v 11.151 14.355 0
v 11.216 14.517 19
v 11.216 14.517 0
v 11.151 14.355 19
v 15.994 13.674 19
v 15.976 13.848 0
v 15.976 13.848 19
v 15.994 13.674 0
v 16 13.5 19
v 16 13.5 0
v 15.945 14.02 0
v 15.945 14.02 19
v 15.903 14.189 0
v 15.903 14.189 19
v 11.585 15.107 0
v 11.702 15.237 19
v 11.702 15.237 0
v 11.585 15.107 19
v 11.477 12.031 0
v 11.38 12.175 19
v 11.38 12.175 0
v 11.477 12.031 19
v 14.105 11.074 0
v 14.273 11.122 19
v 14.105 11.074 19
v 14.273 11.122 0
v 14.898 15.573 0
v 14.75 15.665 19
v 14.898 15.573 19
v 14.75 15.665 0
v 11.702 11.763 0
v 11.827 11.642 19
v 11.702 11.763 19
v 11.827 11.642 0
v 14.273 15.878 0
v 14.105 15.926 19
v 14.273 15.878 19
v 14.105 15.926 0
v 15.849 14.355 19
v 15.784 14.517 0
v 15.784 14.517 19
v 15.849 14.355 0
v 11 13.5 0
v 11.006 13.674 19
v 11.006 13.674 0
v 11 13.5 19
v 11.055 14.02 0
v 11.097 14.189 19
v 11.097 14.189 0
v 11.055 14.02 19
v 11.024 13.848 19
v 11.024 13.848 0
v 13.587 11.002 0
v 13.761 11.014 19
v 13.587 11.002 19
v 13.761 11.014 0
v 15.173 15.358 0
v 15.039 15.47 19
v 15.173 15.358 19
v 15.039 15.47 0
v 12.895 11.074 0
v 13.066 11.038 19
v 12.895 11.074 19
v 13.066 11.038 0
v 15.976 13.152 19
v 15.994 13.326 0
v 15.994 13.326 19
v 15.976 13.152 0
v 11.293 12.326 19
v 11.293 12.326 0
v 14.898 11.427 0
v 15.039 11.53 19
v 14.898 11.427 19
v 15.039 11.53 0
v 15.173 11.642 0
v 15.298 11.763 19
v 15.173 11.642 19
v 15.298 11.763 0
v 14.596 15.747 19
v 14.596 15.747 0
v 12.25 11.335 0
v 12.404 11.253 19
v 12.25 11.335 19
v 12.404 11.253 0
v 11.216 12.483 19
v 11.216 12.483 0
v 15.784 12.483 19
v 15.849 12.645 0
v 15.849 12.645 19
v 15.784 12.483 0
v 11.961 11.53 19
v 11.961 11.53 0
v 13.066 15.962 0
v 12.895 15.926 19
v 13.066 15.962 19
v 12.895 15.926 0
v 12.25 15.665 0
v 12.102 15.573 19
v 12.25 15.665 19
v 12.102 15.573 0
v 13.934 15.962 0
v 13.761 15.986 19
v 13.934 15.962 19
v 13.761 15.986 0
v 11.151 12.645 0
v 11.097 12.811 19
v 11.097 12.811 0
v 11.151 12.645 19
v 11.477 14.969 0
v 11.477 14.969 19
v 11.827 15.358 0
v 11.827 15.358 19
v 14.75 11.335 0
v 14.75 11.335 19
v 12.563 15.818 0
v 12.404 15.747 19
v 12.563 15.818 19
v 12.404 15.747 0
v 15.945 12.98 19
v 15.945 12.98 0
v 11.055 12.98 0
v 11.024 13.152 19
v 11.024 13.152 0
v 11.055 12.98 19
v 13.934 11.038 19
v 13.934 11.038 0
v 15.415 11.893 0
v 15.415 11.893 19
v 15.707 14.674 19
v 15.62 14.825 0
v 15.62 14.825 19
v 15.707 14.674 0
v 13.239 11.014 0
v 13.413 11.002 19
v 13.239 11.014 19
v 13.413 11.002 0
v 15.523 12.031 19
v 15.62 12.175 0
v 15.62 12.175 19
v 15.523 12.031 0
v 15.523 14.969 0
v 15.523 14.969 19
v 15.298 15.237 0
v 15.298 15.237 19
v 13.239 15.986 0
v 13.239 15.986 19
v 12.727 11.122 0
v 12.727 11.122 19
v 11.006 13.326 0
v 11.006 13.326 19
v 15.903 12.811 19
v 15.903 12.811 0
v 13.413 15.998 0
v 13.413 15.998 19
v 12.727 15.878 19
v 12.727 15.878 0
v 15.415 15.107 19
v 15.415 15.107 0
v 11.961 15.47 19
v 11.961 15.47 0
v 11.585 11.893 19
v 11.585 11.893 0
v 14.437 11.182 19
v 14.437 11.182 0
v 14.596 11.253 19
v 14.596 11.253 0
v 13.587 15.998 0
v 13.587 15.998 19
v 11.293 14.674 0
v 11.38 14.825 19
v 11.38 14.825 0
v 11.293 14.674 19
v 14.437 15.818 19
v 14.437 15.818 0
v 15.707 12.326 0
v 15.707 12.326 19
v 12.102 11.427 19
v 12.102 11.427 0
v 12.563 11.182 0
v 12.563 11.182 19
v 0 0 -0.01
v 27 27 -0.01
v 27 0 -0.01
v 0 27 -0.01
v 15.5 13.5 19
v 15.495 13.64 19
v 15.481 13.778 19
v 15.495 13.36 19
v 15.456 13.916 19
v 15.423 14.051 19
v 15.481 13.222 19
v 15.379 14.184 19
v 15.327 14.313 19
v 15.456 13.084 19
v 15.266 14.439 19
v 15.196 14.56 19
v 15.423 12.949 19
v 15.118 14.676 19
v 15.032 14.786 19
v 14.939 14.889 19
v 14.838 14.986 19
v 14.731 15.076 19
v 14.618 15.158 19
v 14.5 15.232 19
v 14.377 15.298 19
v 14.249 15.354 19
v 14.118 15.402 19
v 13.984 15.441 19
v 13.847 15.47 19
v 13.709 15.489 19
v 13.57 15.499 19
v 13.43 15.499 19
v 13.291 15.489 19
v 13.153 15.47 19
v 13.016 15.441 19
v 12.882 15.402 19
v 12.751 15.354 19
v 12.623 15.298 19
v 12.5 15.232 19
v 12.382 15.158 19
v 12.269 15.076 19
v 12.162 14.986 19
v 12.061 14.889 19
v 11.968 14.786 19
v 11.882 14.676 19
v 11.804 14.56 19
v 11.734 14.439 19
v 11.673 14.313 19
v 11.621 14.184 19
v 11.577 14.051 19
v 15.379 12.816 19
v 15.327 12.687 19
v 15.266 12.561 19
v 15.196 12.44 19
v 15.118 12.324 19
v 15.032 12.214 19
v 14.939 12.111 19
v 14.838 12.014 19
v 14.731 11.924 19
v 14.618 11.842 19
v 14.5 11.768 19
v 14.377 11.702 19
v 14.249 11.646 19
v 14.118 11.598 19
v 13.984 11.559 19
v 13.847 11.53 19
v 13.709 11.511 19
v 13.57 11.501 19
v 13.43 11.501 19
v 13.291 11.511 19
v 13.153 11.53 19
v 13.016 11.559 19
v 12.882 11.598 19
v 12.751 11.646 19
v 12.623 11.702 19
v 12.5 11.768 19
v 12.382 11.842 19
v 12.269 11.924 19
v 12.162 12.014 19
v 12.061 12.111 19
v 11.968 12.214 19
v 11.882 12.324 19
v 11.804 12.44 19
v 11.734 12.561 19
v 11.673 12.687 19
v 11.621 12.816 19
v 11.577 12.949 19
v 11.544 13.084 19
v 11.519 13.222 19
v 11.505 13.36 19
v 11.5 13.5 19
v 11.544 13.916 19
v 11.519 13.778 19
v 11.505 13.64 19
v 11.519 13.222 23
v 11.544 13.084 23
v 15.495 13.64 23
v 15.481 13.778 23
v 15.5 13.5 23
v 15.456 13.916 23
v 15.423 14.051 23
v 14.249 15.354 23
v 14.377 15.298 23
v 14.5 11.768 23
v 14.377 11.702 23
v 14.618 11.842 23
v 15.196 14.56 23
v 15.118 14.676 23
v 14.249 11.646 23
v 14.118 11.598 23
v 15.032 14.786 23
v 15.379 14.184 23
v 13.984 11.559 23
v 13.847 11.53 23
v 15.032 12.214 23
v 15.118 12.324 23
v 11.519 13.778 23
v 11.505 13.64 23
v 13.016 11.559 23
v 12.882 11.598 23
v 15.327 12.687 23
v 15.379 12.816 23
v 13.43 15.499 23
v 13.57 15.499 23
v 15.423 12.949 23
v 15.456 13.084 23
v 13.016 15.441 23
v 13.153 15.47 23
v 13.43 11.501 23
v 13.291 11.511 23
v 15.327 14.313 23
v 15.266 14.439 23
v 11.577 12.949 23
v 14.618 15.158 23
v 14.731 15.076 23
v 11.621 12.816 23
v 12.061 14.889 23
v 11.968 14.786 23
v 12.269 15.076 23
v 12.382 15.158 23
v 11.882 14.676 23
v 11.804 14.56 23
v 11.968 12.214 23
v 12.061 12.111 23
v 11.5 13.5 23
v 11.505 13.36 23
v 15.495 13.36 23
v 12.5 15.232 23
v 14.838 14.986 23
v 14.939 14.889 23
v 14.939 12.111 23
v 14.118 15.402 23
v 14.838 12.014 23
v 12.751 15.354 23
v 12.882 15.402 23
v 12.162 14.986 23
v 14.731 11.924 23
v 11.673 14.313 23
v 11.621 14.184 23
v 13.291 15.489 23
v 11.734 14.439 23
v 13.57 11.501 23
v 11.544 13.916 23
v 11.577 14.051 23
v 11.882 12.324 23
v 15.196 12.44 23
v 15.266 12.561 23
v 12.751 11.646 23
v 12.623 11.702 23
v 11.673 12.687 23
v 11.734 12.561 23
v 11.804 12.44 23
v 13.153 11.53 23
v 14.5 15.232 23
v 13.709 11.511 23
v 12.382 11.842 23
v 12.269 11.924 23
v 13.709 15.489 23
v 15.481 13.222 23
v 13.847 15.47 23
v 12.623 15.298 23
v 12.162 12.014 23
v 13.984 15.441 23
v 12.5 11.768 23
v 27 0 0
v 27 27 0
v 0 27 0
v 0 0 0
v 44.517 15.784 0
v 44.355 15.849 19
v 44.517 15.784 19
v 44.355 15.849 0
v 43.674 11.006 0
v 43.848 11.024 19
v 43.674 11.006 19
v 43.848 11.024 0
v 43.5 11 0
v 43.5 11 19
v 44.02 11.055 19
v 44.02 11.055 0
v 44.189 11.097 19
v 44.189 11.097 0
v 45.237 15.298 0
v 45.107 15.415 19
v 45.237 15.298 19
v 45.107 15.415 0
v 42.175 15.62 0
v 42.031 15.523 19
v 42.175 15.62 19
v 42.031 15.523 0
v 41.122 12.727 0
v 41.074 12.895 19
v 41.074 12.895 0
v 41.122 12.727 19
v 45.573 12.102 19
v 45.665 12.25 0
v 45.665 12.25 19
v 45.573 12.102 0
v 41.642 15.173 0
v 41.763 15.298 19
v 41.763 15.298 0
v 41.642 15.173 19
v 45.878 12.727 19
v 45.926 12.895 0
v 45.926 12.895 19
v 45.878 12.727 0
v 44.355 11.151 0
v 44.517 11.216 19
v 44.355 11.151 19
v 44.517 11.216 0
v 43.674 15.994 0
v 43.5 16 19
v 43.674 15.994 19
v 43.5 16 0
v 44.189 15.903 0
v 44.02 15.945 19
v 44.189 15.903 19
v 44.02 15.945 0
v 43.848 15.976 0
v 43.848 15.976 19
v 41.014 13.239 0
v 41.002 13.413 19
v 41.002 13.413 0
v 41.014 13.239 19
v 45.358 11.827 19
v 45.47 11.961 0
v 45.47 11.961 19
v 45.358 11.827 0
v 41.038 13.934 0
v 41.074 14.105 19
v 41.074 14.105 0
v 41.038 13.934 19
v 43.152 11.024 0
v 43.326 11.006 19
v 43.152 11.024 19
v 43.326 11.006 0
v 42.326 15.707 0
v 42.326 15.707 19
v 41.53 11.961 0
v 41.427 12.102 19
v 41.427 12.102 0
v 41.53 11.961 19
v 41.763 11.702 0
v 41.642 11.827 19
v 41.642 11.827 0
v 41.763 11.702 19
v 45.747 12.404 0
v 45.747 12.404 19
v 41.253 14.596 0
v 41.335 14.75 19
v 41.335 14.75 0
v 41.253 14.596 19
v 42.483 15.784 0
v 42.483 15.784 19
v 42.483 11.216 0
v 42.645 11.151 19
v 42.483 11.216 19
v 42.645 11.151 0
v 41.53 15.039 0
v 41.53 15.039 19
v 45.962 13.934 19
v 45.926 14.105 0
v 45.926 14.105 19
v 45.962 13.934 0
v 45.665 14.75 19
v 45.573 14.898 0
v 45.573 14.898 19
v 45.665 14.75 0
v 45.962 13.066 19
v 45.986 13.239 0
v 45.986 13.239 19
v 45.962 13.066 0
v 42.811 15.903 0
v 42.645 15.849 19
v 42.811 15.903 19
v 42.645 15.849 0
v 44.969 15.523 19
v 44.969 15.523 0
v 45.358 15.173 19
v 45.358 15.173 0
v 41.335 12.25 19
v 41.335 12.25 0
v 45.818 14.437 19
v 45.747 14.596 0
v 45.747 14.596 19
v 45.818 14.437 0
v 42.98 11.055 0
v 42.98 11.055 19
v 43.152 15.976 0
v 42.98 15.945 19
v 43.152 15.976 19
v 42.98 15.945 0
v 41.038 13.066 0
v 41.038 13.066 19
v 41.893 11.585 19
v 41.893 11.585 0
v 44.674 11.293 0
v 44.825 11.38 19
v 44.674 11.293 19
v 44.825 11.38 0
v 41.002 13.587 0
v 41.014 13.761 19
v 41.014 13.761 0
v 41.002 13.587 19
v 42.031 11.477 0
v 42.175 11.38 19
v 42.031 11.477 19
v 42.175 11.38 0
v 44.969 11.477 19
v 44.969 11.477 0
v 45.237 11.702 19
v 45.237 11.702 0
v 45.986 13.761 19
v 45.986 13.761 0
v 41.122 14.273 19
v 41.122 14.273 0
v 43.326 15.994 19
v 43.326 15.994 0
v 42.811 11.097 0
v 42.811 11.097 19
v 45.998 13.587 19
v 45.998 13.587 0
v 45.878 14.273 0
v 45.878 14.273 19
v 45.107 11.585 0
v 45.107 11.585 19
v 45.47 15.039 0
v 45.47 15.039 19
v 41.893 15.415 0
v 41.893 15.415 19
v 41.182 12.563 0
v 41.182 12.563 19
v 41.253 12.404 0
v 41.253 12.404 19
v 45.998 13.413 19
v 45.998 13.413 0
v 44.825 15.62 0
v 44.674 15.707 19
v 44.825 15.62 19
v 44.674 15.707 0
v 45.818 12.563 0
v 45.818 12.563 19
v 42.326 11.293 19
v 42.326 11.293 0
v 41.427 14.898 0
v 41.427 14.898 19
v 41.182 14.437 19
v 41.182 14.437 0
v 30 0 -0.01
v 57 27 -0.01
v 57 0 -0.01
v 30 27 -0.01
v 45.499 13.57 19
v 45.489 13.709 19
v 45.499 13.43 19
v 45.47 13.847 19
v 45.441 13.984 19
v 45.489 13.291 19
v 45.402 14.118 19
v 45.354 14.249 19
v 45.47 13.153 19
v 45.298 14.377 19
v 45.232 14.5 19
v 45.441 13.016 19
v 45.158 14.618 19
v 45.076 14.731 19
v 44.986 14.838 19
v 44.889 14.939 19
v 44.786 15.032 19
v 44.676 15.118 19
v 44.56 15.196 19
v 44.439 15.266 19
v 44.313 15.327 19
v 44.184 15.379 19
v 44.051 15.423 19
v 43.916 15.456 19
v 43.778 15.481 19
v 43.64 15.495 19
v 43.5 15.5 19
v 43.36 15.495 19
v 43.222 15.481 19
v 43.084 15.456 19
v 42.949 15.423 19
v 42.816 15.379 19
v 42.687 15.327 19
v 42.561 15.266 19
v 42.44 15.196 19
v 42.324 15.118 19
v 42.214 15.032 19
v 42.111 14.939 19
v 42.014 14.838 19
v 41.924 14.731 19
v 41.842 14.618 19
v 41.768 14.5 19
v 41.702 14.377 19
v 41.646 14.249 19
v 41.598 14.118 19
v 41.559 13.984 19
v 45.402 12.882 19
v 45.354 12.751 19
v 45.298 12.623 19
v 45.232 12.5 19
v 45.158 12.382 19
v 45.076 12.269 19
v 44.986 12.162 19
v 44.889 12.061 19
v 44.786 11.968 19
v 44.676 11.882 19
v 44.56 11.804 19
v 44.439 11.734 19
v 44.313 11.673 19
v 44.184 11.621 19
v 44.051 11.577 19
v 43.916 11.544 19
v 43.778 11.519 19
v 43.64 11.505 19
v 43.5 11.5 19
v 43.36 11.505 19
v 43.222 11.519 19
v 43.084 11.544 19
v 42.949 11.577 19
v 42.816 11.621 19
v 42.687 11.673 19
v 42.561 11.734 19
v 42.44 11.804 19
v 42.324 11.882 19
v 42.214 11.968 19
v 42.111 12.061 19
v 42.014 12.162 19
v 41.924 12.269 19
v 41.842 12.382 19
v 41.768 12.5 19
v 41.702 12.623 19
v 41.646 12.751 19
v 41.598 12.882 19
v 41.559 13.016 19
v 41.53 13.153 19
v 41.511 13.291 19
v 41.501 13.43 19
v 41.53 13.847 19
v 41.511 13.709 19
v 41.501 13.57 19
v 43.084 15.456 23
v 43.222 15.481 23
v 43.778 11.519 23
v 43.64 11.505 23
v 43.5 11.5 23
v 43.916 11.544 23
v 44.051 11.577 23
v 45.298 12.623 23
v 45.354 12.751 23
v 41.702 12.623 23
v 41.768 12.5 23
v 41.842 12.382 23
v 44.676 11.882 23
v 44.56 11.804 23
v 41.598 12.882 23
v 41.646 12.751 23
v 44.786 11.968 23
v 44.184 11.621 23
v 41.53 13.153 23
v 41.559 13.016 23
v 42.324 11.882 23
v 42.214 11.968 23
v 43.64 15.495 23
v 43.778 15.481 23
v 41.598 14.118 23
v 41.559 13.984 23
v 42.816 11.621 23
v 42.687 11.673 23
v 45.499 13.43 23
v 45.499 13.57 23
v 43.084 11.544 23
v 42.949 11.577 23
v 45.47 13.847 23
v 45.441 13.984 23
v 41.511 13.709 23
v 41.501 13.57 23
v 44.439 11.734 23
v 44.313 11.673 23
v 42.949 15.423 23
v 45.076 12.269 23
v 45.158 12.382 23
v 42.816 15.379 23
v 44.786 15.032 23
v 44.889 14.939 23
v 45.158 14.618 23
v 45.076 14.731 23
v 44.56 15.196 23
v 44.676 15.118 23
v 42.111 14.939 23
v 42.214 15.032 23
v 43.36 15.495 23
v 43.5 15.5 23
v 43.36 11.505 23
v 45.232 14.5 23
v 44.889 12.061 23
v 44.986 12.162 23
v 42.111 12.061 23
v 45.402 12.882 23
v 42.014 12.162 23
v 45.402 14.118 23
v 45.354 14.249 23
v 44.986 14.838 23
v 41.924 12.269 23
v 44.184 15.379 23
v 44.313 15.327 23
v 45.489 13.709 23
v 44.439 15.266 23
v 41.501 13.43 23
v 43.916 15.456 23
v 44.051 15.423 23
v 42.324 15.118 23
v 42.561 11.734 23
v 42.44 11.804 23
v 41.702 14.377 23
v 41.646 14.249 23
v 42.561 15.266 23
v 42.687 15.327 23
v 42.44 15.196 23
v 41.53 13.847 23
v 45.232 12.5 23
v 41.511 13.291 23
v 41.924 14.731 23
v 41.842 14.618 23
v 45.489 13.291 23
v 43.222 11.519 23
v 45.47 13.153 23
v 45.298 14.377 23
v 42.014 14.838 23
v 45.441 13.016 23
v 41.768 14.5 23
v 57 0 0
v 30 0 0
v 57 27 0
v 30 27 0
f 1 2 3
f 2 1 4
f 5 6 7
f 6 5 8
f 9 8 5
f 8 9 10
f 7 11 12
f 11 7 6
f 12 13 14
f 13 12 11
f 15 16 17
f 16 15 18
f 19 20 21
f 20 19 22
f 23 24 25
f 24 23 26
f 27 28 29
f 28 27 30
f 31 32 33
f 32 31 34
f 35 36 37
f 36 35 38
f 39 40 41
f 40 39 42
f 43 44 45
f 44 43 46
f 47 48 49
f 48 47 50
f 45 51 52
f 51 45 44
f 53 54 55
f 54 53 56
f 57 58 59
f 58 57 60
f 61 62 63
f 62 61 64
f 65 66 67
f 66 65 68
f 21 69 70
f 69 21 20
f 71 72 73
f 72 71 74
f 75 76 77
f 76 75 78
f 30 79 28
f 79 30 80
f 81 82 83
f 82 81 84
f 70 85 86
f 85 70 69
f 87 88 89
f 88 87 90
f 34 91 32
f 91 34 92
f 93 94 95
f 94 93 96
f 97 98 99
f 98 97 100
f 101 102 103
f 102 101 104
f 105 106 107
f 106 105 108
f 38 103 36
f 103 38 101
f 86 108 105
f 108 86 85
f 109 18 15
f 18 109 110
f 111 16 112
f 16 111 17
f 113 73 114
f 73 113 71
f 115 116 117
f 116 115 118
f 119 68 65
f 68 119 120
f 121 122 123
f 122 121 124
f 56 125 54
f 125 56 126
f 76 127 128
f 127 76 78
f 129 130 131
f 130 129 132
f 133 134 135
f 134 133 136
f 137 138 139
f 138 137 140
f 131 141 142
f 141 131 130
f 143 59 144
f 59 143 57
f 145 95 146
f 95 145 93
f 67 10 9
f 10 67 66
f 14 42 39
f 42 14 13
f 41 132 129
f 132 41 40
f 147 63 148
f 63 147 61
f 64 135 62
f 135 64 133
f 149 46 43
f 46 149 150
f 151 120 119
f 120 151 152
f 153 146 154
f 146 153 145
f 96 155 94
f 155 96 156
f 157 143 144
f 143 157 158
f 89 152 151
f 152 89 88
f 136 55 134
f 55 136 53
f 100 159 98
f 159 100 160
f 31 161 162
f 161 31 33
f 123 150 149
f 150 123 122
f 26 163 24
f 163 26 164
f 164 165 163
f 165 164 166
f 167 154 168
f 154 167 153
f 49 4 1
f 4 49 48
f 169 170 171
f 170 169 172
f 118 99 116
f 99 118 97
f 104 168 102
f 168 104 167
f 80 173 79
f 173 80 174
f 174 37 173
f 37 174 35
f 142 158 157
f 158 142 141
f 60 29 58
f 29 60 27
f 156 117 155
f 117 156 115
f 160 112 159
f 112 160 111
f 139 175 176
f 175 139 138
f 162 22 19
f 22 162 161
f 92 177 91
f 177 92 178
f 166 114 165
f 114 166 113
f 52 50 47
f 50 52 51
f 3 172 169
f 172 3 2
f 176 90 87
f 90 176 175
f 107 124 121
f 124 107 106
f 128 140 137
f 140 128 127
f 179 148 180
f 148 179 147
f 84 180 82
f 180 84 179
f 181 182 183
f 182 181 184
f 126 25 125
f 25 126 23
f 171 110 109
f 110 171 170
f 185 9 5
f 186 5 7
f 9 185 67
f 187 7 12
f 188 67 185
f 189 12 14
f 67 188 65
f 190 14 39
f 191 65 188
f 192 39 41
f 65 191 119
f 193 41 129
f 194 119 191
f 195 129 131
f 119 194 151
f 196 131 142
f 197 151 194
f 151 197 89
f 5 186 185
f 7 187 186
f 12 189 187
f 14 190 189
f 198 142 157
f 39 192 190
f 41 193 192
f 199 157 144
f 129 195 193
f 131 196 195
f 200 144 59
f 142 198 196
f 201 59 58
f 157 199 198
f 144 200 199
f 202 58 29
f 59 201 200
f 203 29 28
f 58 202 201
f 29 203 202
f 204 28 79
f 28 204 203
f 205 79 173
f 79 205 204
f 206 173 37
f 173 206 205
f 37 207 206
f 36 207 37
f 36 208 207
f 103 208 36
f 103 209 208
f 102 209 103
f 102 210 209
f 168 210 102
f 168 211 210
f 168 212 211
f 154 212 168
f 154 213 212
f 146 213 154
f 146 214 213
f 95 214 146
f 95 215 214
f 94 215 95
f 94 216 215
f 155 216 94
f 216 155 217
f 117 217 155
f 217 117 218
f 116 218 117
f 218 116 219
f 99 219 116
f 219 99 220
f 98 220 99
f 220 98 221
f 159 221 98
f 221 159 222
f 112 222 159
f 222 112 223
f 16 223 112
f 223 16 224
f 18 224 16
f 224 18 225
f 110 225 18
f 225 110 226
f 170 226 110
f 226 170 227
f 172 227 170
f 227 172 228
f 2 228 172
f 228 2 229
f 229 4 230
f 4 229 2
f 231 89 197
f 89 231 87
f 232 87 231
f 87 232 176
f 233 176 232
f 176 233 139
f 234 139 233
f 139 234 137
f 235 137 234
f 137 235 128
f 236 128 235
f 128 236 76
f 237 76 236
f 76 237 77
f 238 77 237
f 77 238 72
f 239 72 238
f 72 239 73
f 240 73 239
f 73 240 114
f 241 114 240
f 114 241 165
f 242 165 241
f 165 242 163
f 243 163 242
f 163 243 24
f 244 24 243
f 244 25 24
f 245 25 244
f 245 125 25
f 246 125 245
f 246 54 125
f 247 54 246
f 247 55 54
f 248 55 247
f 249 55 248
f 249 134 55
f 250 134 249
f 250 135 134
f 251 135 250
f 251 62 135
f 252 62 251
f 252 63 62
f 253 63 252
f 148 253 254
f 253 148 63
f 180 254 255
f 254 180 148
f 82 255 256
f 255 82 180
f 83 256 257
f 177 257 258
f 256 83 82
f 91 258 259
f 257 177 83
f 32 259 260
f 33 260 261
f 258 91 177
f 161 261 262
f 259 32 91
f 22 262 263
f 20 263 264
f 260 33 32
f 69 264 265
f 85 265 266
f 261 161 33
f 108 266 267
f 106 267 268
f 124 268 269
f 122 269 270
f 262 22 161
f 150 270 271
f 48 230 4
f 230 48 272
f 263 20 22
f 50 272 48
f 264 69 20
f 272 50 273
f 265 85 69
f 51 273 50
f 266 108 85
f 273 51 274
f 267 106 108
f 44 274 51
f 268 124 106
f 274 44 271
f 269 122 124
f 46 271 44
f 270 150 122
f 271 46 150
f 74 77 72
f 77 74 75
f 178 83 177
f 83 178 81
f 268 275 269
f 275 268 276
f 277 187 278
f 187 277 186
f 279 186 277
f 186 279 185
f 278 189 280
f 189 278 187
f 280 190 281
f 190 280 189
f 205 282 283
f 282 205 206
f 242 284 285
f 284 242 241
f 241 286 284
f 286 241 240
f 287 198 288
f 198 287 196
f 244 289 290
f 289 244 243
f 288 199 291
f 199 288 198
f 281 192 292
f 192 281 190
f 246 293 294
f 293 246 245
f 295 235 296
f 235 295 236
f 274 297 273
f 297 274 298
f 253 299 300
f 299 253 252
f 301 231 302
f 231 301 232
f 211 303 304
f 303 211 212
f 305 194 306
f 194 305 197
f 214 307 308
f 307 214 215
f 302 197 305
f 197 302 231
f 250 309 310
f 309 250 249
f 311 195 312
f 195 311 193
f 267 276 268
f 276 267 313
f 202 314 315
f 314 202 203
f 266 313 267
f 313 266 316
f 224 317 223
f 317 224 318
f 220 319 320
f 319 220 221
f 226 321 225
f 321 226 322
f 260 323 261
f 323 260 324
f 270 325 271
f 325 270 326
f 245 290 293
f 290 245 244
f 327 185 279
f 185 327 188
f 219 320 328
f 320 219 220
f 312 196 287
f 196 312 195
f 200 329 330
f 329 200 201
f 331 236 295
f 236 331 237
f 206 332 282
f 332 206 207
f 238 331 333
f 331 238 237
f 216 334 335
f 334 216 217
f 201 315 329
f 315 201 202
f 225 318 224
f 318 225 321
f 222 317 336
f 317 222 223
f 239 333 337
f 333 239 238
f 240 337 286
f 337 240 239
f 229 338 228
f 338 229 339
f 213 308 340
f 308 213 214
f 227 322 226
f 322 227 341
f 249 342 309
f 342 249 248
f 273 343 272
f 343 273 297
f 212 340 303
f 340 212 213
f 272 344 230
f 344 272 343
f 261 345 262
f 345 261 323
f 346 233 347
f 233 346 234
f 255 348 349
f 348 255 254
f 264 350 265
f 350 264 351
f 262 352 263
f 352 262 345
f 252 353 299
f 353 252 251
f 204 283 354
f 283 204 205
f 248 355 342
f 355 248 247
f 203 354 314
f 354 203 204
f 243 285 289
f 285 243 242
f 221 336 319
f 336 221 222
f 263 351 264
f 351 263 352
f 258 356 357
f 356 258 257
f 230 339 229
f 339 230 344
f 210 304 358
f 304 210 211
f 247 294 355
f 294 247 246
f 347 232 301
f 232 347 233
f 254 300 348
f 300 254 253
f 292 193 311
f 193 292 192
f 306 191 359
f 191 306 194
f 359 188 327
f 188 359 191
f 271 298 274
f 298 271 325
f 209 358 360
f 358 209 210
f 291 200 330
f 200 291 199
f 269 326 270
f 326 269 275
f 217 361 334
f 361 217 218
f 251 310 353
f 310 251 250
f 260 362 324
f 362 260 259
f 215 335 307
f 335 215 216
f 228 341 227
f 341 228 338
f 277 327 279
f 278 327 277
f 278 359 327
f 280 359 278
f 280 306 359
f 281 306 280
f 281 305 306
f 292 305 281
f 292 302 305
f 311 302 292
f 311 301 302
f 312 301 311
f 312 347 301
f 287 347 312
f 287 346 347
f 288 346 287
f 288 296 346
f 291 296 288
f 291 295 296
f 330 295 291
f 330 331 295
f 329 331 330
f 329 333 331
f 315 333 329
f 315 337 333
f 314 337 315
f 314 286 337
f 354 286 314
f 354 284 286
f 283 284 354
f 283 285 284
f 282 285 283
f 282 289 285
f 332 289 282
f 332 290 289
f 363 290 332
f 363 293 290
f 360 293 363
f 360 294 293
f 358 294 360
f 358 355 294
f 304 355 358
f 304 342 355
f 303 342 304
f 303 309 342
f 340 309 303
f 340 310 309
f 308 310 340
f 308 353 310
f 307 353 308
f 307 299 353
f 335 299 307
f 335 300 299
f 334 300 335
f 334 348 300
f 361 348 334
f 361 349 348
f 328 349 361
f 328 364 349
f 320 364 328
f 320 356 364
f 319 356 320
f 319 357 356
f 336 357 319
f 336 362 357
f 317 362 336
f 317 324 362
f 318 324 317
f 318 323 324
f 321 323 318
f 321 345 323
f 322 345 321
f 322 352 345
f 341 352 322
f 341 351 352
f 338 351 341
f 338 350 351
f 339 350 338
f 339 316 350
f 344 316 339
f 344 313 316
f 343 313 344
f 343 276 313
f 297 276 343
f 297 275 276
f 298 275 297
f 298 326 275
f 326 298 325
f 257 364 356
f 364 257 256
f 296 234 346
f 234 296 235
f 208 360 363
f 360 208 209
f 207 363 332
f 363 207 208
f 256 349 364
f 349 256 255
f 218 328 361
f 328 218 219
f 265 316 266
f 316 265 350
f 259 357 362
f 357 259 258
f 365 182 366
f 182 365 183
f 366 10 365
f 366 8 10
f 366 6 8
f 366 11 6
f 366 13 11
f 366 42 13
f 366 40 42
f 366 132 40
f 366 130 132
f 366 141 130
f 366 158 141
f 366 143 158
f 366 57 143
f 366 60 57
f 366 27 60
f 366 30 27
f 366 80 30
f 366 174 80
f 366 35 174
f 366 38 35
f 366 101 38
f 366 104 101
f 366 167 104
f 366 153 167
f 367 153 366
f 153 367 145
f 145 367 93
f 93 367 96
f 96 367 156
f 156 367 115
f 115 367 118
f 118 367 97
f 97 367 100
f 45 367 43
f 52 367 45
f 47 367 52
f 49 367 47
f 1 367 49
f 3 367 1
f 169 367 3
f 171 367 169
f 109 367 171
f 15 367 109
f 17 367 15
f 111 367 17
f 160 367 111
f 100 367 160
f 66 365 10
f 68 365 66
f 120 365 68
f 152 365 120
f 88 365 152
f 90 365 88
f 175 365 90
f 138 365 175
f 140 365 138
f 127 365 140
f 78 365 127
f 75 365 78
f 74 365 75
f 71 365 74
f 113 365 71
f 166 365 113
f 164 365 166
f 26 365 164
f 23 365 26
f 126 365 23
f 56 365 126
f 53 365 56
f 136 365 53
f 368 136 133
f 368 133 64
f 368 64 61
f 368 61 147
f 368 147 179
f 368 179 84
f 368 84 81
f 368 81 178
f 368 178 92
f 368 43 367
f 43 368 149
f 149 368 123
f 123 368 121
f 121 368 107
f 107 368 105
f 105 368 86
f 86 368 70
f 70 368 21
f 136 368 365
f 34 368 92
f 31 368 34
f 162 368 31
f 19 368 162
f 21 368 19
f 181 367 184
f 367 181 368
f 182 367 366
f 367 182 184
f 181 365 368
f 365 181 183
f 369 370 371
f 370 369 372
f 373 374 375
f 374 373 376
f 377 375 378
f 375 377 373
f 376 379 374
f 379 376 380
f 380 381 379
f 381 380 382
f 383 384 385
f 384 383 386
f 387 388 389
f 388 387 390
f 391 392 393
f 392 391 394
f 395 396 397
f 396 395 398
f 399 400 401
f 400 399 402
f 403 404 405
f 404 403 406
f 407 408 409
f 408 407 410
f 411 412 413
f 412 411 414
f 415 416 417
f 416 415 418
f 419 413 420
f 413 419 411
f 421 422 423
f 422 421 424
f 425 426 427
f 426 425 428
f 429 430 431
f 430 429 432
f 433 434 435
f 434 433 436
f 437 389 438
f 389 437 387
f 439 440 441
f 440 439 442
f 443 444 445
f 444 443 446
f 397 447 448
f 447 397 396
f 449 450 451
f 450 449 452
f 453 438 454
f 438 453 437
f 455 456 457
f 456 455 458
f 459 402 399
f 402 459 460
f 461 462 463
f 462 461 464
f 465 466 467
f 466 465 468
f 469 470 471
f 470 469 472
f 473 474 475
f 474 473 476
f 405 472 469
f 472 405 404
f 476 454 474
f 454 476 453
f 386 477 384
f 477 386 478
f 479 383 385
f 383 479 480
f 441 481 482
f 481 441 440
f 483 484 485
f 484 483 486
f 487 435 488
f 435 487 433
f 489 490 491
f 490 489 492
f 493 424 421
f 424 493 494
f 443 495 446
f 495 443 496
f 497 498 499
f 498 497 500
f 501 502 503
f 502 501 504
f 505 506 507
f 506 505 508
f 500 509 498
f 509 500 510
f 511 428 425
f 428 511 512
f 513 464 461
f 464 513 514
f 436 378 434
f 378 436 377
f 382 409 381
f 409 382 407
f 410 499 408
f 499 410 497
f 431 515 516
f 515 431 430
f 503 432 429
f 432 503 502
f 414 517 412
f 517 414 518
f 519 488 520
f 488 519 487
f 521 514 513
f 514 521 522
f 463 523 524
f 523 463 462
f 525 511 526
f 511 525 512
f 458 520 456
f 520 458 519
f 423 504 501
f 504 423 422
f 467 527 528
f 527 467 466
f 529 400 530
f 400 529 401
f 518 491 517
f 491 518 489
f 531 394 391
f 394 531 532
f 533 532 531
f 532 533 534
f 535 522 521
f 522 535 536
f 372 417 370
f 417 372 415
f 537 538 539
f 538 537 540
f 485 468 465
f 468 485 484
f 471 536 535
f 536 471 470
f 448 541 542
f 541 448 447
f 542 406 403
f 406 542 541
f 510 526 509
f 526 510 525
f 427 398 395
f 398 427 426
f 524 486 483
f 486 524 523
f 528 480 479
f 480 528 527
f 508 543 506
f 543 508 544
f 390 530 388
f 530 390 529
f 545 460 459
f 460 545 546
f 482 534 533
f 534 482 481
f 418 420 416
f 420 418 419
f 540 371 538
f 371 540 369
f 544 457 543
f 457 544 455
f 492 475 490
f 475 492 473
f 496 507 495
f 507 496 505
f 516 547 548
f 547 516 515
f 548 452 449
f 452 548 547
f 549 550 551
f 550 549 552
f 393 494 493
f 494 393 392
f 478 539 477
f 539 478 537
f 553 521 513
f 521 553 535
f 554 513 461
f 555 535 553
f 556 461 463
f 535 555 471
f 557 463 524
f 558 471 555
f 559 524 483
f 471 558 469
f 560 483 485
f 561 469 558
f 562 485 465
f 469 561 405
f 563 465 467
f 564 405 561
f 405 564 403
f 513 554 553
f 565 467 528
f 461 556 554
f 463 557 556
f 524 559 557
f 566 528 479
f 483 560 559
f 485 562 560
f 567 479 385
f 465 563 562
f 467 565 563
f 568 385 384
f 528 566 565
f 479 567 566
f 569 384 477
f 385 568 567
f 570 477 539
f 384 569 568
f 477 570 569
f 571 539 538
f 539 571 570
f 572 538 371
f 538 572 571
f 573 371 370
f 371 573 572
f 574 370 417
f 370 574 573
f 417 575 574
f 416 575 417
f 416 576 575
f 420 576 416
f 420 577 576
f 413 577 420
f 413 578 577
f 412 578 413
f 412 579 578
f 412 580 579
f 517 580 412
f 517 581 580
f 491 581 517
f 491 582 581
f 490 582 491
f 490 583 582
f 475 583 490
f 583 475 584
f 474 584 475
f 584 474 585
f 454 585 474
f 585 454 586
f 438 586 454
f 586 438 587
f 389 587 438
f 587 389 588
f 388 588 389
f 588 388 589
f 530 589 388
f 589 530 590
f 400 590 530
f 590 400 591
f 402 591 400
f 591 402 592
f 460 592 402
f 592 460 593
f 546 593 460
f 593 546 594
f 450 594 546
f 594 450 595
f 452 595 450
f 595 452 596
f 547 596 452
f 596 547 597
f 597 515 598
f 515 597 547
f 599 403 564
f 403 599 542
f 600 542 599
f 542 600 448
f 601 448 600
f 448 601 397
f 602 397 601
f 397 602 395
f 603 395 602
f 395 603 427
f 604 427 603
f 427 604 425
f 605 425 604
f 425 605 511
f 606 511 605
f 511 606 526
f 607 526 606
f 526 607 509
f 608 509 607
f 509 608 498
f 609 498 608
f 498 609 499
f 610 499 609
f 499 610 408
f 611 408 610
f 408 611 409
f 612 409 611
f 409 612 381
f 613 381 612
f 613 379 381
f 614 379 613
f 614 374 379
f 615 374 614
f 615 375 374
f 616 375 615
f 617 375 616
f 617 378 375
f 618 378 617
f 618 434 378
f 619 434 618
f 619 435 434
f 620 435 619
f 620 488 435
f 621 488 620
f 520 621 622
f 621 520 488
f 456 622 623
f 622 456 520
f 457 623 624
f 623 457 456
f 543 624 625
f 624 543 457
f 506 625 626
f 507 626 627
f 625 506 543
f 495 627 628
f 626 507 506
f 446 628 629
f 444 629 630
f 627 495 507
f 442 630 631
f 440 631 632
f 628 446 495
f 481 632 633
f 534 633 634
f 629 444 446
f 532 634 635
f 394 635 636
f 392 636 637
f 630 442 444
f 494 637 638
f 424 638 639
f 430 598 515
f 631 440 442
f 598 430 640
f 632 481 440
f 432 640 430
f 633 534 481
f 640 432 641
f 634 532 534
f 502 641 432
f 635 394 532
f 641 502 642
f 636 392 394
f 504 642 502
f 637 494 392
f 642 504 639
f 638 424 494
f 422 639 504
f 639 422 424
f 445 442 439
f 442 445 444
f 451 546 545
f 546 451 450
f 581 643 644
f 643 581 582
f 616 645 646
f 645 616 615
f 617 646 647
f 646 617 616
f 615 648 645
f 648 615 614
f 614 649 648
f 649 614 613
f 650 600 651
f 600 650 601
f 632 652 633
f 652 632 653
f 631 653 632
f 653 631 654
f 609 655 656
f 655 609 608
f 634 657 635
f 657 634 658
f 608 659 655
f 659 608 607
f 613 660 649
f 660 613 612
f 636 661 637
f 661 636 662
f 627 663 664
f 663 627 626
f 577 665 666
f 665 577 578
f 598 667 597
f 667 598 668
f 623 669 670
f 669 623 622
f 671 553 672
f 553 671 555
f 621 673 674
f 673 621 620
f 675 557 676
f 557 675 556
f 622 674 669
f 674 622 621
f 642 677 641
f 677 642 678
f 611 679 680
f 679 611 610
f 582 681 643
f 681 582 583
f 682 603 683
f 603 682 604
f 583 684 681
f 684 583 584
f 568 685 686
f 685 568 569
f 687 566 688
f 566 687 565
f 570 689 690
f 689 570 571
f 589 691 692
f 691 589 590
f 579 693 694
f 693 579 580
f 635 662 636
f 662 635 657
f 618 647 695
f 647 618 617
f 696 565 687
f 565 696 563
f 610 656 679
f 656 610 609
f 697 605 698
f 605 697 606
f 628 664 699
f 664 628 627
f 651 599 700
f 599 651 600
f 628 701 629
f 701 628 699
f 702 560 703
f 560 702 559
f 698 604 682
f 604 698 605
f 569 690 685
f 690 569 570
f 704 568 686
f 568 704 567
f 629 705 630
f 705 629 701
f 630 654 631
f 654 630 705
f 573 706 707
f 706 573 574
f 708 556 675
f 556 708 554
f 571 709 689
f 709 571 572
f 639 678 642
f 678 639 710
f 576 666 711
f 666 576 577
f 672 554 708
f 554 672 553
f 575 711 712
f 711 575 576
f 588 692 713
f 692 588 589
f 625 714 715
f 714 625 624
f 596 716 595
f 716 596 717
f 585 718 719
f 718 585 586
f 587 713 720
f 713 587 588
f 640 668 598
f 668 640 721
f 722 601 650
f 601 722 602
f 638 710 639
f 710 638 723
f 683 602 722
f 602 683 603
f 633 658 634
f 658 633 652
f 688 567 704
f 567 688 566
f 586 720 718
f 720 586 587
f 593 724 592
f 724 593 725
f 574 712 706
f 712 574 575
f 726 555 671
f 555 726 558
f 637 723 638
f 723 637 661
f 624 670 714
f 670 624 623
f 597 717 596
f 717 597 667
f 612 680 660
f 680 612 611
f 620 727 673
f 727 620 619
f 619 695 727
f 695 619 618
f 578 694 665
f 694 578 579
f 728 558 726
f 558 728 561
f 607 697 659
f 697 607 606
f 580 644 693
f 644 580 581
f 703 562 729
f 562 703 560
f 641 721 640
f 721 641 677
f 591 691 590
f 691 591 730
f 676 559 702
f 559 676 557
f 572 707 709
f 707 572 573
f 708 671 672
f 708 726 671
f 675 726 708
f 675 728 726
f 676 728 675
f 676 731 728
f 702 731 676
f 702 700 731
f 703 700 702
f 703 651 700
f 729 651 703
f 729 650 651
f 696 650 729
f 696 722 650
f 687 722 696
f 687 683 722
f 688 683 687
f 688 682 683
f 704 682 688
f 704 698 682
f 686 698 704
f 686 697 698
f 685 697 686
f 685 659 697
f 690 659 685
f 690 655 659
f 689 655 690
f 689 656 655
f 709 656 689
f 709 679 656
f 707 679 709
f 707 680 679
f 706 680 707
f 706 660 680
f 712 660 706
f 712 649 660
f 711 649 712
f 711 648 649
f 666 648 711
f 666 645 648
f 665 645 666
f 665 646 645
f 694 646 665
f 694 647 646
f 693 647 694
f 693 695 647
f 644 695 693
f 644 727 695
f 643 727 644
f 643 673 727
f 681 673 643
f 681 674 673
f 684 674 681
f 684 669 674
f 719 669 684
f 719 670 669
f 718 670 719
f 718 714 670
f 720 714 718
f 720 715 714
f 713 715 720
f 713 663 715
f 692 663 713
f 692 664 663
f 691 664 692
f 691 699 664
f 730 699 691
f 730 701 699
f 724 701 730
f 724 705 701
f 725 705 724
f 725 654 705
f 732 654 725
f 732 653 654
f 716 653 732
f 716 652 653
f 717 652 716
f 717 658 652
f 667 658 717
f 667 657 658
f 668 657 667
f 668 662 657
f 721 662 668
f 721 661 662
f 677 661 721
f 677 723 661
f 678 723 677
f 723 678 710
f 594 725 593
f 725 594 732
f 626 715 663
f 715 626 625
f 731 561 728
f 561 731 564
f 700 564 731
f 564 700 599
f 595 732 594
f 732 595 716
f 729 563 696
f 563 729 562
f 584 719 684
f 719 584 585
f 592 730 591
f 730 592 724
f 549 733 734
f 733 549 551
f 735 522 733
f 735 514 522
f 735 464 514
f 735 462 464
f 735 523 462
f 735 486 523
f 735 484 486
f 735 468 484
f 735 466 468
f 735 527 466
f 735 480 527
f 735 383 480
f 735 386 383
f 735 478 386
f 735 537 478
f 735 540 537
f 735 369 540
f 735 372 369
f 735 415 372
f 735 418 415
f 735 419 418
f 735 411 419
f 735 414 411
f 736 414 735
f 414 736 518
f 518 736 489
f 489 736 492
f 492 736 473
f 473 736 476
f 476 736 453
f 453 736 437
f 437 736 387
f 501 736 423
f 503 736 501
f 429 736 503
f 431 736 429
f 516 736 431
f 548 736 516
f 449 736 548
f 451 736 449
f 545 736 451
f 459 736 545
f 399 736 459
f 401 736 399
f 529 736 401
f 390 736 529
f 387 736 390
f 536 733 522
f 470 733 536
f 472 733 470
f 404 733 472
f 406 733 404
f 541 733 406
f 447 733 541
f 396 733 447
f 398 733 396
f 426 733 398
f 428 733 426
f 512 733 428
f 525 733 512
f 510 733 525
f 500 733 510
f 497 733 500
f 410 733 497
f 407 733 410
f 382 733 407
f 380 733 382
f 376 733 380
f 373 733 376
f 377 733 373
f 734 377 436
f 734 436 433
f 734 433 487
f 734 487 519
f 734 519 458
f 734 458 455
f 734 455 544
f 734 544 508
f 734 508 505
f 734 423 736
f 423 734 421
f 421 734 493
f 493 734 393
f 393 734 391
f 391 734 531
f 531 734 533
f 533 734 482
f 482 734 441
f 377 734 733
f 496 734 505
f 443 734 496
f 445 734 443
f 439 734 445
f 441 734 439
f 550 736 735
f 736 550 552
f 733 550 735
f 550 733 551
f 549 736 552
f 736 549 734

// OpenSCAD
// file: ../../Base/Boxes.scad
// Fischertechnik Box Foundation
// Pre-designed Boxes

use <Constants.scad>

include <PlacementOptions.scad>

box190Width = 190;
box190Depth = 130;
box130Width = 130;
box130Depth = 95;
boxUsageHeight = 33.9;
boxWallThickness = 2.4;
boxBaseThickness = 1.0;
boxWebWidth = 3.0;

// getBoxWallThickness()
// Gets the wall thickness of a Fischertechnik Box

function getBoxWallThickness() = boxWallThickness;

// Gets the usable height of a fischertechnik box
function getBoxUsageHeight() = boxUsageHeight;

// Gets the thickness of the Fischertechnik box base.
function getBoxBaseThickness() = boxBaseThickness;

// Gets the width of a box web
function getBoxWebWidth() = boxWebWidth;

// Gets the usable inner space of a Box 190 as an x/y-list
function getBox190Space() = [
    box190Width - 2*getBoxWallThickness(), 
    box190Depth - 2*getBoxWallThickness() ];

// Imports the Fischertechnik empty box 130x190 mm and places it at position 0,0
// 190x130 are the outer sizes, the inner space is slightly smaller. Use getBox190Space() to get the inner sizes.
// This module needs the STL file "Fischertechnik Box 130x190.stl" in the library path.
// The box is positioned that the usable inner space is at the 0,0,0 position. The

module Box190() {
    translate([-getBoxWallThickness(),-getBoxWallThickness(),-getBoxBaseThickness()])
        import("Fischertechnik Box 130x190.stl", convexity=3);
}

// Gets the usable inner space of a Box 130 as an x/y-list
function getBox130Space() = [
    box130Width - 2*getBoxWallThickness(), 
    box130Depth - 2*getBoxWallThickness() ];

// Imports the Fischertechnik empty box 95x130 mm and places it at position 0,0
// 190x130 are the outer sizes, the inner space is slightly smaller. Use getBox190Space() to get the inner sizes.
// This module needs the STL file "Fischertechnik Box 95x130.stl" in the library path.
// The box is positioned that the usable inner space is at the 0,0,0 position. The

module Box130() {
    translate([-getBoxWallThickness(),-getBoxWallThickness(),-getBoxBaseThickness()])
        import("Fischertechnik Box 95x130.stl", convexity=3);
}

// Creates a web at the specified box walls
// corner 0 = LowerLeft, 1 = UpperLeft, 2 = UpperRight, 3 = LowerRight
// side 0 = LeftOfCorner, 1 = RightOfCorner
// distance = Distance in mm from the corner
// box = inner width and depth of the box (default: Box 190)
// webWidth = length of the web (default is 3 mms)
// webThickness = thickness of the web (default is 1 mm)

module BoxWeb(corner, side, distance, box=getBox190Space(), webWidth=getBoxWebWidth(), webThickness=1.0) {
    sink = getBoxWallThickness()/2;

    width = (corner % 2 == 0) ? 
            (side == LeftOfCorner ? webWidth : webThickness) :
            (side == LeftOfCorner ? webThickness : webWidth);

    depth = (corner % 2 == 0) ? 
            (side == RightOfCorner ? webWidth : webThickness) :
            (side == RightOfCorner ? webThickness : webWidth);
    
    xDiff = corner == LowerLeft ? 
                (side == LeftOfCorner ? -sink : distance) :
            (corner == UpperLeft ?                
                (side == LeftOfCorner ? distance : -sink) :
            (corner == UpperRight ?
                (side == LeftOfCorner ? box.x-webWidth+sink : box.x-distance-webThickness) :
                (side == LeftOfCorner ? box.x-distance-webThickness: box.x-webWidth+sink)));

    yDiff = corner == LowerLeft ? 
                (side == RightOfCorner ? -sink : distance) :
            (corner == UpperLeft ?
                (side == RightOfCorner ? box.y-distance : box.y-webWidth+sink) :
            (corner == UpperRight ?
                (side == RightOfCorner ? box.y-webWidth+sink : box.y-distance) :
                (side == RightOfCorner ? distance : -sink)));
    
    translate([xDiff, yDiff, -getExcess()])
        cube([width, depth, boxUsageHeight + 2*getExcess()]);
}
// file: ../../Base/Rotation.scad
// Fischertechnik Box Foundation
// Geometry Helpers Rotation

include <PlacementOptions.scad>

// getRotatedSpace(space, rotation=NoRotation)
// Rotates the space dependent on the specified rotation

function getRotatedSpace(space, rotation=NoRotation) = [
    (rotation == Rotate90 || rotation == Rotate270) ? space.y : space.x,
    (rotation == Rotate90 || rotation == Rotate270) ? space.x : space.y
];

// Rotates the given space around the fixed left lower corner
// space = the space the children needs as width/depth list [width,depth]
// rotation = 0 Rotate0 degrees, 1 Rotate90 degrees, 2 Rotate180 degrees, 3 Rotate270 degrees (equivalent to -90)

module RotateFix(space, rotation=Rotate0) {
    dy = (rotation == Rotate0 || rotation == Rotate270) ? 0 :
        (rotation == Rotate90) ? space.x :
        space.y;
    dx = (rotation < Rotate180) ? 0 :
        (rotation == Rotate180) ? space.x :
        space.y;
    
    translate([dx, dy, 0])
        rotate([0, 0, rotations[rotation]])
            children();
}
// file: ../../Base/Alignment.scad
// Fischertechnik Box Foundation
// Geometry Helpers Alignment

include <PlacementOptions.scad>

// getAlignedX(elementWidth, spaceWidth, align=AlignRight, offset=0)
// Gets the aligned X offset of an element with the given
// width in the given space.
// elementWidth = The width of the element to positon
// spaceWidth = The space where the element should be aligned
// align = 0 AlignLeft, 1 AlignCenter, 2 AlignRight
// offset = an optional offset from the aligned position. When
// aligned left or centered, then positive values are in X direction.
// When aligned right then positive values are in negative X direction.

function getAlignedX(elementWidth, spaceWidth, align=AlignRight, offset=0) =
    (align == AlignLeft) ?
        offset :
        ((align == AlignCenter) ?
        (spaceWidth - elementWidth)/2 + offset :
        spaceWidth - offset - elementWidth);

// getAlignedY(elementDepth, spaceDepth, align=AlignTop, offset=0)
// Gets the aligned Y offset of an element with the given
// depth in the given space.
// elementDepth = The depth of the element to positon
// spaceDepth = The space where the element should be aligned
// align = 0 AlignBottom, 1 AlignCenter, 2 AlignTop
// offset = an optional offset from the aligned position. When
// aligned bottom or centered, then positive values are in Y direction.
// When aligned top then positive values are in negative Y direction.

function getAlignedY(elementDepth, spaceDepth, align=AlignTop, offset=0) =
    (align == AlignBottom) ?
        offset :
        ((align == AlignCenter) ?
        (spaceDepth - elementDepth)/2 + offset :
        spaceDepth - offset - elementDepth);
// file: ../../Base/Constants.scad
// Fischertechnik Box Foundation
// Constants

// Constant values necessary for multiple elements

// Base constants
dividerThickness = 1.2;
excess = 0.01;
fragments = 90;
tolerance = 0.8;

// Gets the thickness of a divider 
function getDividerThickness() = dividerThickness;

// Gets the excess that is used to merge walls into each other
function getExcess() = excess;

// Gets amount of fragments of a cylinder
function getFragments() = fragments;

// Gets the inner tolerance of a frame to each side
function getTolerance() = tolerance;


// Fischertechnik specific constants
axisDiameter = 4;
axisBottomDiameter = axisDiameter + 1;
standardEdgeDistance = 2.5;
standardWebDistance = 11.5;
standardCornerLength = 15;
tubeWallFactor = 0.8;

// Gets axis diameter
function getAxisDiameter() = axisDiameter;

// Gets axis bottom diameter for thicker part at the bottom
function getAxisBottomDiameter() = axisBottomDiameter;

// gets the standard distance to the wall of the box for dockable frames with webs
function getStandardEdgeDistance() = standardEdgeDistance;

// gets the standard distance of each web to the corner of the dockable frame
function getStandardWebDistance() = standardWebDistance;

// gets the standard length of the corner walls of a dockable frame
function getStandardCornerLength() = standardCornerLength;

// gets the wall thickness of a tube.
function getTubeWallThickness() = tubeWallFactor * getDividerThickness();
// file: ../../Base/PlacementOptions.scad
// Fischertechnik Box Foundation
// Placement Options

// Alignment
NoAlign = 0;
AlignLeft = 1;
AlignBottom = 2;
AlignCenter = 3;
AlignRight = 4;
AlignTop = 5;

// Element rotation degree steps
rotations = [0, -90, -180, -270];

// Rotation
NoRotation = 0;
Rotate0 = 0;
Rotate90 = 1;
Rotate180 = 2;
Rotate270 = 3;

// Docking (seen from above)
NoDock = -1;
DockLeft = 0;
DockTop = 1;
DockRight = 2;
DockCorner = 2;
DockBottom = 3;

// Web corners
LowerLeft = 0;
UpperLeft = 1;
UpperRight = 2;
LowerRight = 3;

// Web position relative to corner
LeftOfCorner = 0;
RightOfCorner = 1;
// file: ../../Elements/AxisIdlerGearZ15.scad
// Fischertechnik Box Library
// Axis for idler gear Z15
// 35695

use <../ModelBase/Simple.scad>

width = 27;
depth = 27;
height = 23;

// getAxisIdlerGearZ15Space()
// Gets the space of an axis for an idler gear Z15 (mot2)

function getAxisIdlerGearZ15Space() = [width, depth, height];

// AxisIdlerGearZ15()
// Axis for for an idler gear Z15 (mot2)

module AxisIdlerGearZ15() {
    LeveledAxisWithSpace(height, height-4, getAxisIdlerGearZ15Space());
}

// Tests
color("lightgray")
AxisIdlerGearZ15();
// file: ../../Base/Placement.scad
// Fischertechnik Box Foundation
// Geometry Helpers Placement

use <Constants.scad>
use <Alignment.scad>
use <Rotation.scad>
use <Boxes.scad>

include <PlacementOptions.scad>

// Place(x=0, y=0, elementSpace=[0,0], alignX=AlignLeft, alignY=AlignBottom, rotation=Rotate0, boxSpace=getBox190Space())
// Places the child at the specified position
// y = Y-Position. This is a relative position when an X aligment is specified.
// x = X-Position. This is a relative position when an Y aligment is specified.
// elementSpace = space of the element to be placed [x,y]
// alignX = -1=NoAlign, 0 AlignLeft, 1 AlignCenter, 3 AlignRight (elementSpace and boxSpace required!)
// alignY = -1=NoAlign, 2 AlignBottom, 1 AlignCenter, 4 AlignTop (elementSpace and boxSpace required!)
// rotation = 0 Rotate0 0 degrees, 1 Rotate90 90 degrees, 
// 2 Rotate180 180 degrees, 3 Rotate270 270 degrees (equivalent to -90)
// boxSpace = Inner space of the box where the placement occurs [x,y] - default is Box 190x130 inner space

module Place(x=0, y=0, elementSpace=[0,0], 
  alignX=AlignLeft, alignY=AlignBottom, 
  rotation=NoRotation, boxSpace=getBox190Space()) {

    module Position(x, y, space, rotation=Rotate0) {
        translate([x, y, 0])
            RotateFix(space, rotation)
                children();
    }

    space = getRotatedSpace(elementSpace, rotation);
    alignedX = getAlignedX(space.x, boxSpace.x, alignX, x);
    alignedY = getAlignedY(space.y, boxSpace.y, alignY, y);
    Position(alignedX, alignedY, elementSpace, rotation)
        children();
}

// Center(space=getBox130Space(), elementSpace=[0,0])
// space = Space where the children is centered. For cylinder use centered=true and no elementSpace.
// elementSpace = space of the element to be centered [x,y]

module Center(space=getBox190Space(), elementSpace=[0,0]) {
    translate([(space.x - elementSpace.x) / 2, (space.y - elementSpace.y) / 2])
        children(0);
}

// CenterHorizontal(width=0, y=0, offset=0, space=getBox130Space())
// space = Space where the children is centered. For cylinder use centered=true and no elementSpace.
// elementSpace = space of the element to be centered [x,y]

module CenterHorizontal(width=0, y=0, offset=0, space=getBox190Space()) {
    translate([(space.x - width) / 2 + offset, y])
        children(0);
}

// CenterVertical(depth=0, x=0, offset=0, space=getBox130Space())
// space = Space where the children is centered. For cylinder use centered=true and no elementSpace.
// elementSpace = space of the element to be centered [x,y]

module CenterVertical(depth=0, x=0, offset=0, space=getBox190Space()) {
    translate([x, (space.y - depth) / 2 + offset])
        children(0);
}
// main file
// Fischertechnik Box Foundation
// Elements
// Test AxisIdlerGearZ15

use <../../Base/Placement.scad>
use <../../Elements/AxisIdlerGearZ15.scad>

include <../../Base/PlacementOptions.scad>

AxisIdlerGearZ15();

Place(30, 0, getAxisIdlerGearZ15Space(), rotation=Rotate90)
    AxisIdlerGearZ15();
